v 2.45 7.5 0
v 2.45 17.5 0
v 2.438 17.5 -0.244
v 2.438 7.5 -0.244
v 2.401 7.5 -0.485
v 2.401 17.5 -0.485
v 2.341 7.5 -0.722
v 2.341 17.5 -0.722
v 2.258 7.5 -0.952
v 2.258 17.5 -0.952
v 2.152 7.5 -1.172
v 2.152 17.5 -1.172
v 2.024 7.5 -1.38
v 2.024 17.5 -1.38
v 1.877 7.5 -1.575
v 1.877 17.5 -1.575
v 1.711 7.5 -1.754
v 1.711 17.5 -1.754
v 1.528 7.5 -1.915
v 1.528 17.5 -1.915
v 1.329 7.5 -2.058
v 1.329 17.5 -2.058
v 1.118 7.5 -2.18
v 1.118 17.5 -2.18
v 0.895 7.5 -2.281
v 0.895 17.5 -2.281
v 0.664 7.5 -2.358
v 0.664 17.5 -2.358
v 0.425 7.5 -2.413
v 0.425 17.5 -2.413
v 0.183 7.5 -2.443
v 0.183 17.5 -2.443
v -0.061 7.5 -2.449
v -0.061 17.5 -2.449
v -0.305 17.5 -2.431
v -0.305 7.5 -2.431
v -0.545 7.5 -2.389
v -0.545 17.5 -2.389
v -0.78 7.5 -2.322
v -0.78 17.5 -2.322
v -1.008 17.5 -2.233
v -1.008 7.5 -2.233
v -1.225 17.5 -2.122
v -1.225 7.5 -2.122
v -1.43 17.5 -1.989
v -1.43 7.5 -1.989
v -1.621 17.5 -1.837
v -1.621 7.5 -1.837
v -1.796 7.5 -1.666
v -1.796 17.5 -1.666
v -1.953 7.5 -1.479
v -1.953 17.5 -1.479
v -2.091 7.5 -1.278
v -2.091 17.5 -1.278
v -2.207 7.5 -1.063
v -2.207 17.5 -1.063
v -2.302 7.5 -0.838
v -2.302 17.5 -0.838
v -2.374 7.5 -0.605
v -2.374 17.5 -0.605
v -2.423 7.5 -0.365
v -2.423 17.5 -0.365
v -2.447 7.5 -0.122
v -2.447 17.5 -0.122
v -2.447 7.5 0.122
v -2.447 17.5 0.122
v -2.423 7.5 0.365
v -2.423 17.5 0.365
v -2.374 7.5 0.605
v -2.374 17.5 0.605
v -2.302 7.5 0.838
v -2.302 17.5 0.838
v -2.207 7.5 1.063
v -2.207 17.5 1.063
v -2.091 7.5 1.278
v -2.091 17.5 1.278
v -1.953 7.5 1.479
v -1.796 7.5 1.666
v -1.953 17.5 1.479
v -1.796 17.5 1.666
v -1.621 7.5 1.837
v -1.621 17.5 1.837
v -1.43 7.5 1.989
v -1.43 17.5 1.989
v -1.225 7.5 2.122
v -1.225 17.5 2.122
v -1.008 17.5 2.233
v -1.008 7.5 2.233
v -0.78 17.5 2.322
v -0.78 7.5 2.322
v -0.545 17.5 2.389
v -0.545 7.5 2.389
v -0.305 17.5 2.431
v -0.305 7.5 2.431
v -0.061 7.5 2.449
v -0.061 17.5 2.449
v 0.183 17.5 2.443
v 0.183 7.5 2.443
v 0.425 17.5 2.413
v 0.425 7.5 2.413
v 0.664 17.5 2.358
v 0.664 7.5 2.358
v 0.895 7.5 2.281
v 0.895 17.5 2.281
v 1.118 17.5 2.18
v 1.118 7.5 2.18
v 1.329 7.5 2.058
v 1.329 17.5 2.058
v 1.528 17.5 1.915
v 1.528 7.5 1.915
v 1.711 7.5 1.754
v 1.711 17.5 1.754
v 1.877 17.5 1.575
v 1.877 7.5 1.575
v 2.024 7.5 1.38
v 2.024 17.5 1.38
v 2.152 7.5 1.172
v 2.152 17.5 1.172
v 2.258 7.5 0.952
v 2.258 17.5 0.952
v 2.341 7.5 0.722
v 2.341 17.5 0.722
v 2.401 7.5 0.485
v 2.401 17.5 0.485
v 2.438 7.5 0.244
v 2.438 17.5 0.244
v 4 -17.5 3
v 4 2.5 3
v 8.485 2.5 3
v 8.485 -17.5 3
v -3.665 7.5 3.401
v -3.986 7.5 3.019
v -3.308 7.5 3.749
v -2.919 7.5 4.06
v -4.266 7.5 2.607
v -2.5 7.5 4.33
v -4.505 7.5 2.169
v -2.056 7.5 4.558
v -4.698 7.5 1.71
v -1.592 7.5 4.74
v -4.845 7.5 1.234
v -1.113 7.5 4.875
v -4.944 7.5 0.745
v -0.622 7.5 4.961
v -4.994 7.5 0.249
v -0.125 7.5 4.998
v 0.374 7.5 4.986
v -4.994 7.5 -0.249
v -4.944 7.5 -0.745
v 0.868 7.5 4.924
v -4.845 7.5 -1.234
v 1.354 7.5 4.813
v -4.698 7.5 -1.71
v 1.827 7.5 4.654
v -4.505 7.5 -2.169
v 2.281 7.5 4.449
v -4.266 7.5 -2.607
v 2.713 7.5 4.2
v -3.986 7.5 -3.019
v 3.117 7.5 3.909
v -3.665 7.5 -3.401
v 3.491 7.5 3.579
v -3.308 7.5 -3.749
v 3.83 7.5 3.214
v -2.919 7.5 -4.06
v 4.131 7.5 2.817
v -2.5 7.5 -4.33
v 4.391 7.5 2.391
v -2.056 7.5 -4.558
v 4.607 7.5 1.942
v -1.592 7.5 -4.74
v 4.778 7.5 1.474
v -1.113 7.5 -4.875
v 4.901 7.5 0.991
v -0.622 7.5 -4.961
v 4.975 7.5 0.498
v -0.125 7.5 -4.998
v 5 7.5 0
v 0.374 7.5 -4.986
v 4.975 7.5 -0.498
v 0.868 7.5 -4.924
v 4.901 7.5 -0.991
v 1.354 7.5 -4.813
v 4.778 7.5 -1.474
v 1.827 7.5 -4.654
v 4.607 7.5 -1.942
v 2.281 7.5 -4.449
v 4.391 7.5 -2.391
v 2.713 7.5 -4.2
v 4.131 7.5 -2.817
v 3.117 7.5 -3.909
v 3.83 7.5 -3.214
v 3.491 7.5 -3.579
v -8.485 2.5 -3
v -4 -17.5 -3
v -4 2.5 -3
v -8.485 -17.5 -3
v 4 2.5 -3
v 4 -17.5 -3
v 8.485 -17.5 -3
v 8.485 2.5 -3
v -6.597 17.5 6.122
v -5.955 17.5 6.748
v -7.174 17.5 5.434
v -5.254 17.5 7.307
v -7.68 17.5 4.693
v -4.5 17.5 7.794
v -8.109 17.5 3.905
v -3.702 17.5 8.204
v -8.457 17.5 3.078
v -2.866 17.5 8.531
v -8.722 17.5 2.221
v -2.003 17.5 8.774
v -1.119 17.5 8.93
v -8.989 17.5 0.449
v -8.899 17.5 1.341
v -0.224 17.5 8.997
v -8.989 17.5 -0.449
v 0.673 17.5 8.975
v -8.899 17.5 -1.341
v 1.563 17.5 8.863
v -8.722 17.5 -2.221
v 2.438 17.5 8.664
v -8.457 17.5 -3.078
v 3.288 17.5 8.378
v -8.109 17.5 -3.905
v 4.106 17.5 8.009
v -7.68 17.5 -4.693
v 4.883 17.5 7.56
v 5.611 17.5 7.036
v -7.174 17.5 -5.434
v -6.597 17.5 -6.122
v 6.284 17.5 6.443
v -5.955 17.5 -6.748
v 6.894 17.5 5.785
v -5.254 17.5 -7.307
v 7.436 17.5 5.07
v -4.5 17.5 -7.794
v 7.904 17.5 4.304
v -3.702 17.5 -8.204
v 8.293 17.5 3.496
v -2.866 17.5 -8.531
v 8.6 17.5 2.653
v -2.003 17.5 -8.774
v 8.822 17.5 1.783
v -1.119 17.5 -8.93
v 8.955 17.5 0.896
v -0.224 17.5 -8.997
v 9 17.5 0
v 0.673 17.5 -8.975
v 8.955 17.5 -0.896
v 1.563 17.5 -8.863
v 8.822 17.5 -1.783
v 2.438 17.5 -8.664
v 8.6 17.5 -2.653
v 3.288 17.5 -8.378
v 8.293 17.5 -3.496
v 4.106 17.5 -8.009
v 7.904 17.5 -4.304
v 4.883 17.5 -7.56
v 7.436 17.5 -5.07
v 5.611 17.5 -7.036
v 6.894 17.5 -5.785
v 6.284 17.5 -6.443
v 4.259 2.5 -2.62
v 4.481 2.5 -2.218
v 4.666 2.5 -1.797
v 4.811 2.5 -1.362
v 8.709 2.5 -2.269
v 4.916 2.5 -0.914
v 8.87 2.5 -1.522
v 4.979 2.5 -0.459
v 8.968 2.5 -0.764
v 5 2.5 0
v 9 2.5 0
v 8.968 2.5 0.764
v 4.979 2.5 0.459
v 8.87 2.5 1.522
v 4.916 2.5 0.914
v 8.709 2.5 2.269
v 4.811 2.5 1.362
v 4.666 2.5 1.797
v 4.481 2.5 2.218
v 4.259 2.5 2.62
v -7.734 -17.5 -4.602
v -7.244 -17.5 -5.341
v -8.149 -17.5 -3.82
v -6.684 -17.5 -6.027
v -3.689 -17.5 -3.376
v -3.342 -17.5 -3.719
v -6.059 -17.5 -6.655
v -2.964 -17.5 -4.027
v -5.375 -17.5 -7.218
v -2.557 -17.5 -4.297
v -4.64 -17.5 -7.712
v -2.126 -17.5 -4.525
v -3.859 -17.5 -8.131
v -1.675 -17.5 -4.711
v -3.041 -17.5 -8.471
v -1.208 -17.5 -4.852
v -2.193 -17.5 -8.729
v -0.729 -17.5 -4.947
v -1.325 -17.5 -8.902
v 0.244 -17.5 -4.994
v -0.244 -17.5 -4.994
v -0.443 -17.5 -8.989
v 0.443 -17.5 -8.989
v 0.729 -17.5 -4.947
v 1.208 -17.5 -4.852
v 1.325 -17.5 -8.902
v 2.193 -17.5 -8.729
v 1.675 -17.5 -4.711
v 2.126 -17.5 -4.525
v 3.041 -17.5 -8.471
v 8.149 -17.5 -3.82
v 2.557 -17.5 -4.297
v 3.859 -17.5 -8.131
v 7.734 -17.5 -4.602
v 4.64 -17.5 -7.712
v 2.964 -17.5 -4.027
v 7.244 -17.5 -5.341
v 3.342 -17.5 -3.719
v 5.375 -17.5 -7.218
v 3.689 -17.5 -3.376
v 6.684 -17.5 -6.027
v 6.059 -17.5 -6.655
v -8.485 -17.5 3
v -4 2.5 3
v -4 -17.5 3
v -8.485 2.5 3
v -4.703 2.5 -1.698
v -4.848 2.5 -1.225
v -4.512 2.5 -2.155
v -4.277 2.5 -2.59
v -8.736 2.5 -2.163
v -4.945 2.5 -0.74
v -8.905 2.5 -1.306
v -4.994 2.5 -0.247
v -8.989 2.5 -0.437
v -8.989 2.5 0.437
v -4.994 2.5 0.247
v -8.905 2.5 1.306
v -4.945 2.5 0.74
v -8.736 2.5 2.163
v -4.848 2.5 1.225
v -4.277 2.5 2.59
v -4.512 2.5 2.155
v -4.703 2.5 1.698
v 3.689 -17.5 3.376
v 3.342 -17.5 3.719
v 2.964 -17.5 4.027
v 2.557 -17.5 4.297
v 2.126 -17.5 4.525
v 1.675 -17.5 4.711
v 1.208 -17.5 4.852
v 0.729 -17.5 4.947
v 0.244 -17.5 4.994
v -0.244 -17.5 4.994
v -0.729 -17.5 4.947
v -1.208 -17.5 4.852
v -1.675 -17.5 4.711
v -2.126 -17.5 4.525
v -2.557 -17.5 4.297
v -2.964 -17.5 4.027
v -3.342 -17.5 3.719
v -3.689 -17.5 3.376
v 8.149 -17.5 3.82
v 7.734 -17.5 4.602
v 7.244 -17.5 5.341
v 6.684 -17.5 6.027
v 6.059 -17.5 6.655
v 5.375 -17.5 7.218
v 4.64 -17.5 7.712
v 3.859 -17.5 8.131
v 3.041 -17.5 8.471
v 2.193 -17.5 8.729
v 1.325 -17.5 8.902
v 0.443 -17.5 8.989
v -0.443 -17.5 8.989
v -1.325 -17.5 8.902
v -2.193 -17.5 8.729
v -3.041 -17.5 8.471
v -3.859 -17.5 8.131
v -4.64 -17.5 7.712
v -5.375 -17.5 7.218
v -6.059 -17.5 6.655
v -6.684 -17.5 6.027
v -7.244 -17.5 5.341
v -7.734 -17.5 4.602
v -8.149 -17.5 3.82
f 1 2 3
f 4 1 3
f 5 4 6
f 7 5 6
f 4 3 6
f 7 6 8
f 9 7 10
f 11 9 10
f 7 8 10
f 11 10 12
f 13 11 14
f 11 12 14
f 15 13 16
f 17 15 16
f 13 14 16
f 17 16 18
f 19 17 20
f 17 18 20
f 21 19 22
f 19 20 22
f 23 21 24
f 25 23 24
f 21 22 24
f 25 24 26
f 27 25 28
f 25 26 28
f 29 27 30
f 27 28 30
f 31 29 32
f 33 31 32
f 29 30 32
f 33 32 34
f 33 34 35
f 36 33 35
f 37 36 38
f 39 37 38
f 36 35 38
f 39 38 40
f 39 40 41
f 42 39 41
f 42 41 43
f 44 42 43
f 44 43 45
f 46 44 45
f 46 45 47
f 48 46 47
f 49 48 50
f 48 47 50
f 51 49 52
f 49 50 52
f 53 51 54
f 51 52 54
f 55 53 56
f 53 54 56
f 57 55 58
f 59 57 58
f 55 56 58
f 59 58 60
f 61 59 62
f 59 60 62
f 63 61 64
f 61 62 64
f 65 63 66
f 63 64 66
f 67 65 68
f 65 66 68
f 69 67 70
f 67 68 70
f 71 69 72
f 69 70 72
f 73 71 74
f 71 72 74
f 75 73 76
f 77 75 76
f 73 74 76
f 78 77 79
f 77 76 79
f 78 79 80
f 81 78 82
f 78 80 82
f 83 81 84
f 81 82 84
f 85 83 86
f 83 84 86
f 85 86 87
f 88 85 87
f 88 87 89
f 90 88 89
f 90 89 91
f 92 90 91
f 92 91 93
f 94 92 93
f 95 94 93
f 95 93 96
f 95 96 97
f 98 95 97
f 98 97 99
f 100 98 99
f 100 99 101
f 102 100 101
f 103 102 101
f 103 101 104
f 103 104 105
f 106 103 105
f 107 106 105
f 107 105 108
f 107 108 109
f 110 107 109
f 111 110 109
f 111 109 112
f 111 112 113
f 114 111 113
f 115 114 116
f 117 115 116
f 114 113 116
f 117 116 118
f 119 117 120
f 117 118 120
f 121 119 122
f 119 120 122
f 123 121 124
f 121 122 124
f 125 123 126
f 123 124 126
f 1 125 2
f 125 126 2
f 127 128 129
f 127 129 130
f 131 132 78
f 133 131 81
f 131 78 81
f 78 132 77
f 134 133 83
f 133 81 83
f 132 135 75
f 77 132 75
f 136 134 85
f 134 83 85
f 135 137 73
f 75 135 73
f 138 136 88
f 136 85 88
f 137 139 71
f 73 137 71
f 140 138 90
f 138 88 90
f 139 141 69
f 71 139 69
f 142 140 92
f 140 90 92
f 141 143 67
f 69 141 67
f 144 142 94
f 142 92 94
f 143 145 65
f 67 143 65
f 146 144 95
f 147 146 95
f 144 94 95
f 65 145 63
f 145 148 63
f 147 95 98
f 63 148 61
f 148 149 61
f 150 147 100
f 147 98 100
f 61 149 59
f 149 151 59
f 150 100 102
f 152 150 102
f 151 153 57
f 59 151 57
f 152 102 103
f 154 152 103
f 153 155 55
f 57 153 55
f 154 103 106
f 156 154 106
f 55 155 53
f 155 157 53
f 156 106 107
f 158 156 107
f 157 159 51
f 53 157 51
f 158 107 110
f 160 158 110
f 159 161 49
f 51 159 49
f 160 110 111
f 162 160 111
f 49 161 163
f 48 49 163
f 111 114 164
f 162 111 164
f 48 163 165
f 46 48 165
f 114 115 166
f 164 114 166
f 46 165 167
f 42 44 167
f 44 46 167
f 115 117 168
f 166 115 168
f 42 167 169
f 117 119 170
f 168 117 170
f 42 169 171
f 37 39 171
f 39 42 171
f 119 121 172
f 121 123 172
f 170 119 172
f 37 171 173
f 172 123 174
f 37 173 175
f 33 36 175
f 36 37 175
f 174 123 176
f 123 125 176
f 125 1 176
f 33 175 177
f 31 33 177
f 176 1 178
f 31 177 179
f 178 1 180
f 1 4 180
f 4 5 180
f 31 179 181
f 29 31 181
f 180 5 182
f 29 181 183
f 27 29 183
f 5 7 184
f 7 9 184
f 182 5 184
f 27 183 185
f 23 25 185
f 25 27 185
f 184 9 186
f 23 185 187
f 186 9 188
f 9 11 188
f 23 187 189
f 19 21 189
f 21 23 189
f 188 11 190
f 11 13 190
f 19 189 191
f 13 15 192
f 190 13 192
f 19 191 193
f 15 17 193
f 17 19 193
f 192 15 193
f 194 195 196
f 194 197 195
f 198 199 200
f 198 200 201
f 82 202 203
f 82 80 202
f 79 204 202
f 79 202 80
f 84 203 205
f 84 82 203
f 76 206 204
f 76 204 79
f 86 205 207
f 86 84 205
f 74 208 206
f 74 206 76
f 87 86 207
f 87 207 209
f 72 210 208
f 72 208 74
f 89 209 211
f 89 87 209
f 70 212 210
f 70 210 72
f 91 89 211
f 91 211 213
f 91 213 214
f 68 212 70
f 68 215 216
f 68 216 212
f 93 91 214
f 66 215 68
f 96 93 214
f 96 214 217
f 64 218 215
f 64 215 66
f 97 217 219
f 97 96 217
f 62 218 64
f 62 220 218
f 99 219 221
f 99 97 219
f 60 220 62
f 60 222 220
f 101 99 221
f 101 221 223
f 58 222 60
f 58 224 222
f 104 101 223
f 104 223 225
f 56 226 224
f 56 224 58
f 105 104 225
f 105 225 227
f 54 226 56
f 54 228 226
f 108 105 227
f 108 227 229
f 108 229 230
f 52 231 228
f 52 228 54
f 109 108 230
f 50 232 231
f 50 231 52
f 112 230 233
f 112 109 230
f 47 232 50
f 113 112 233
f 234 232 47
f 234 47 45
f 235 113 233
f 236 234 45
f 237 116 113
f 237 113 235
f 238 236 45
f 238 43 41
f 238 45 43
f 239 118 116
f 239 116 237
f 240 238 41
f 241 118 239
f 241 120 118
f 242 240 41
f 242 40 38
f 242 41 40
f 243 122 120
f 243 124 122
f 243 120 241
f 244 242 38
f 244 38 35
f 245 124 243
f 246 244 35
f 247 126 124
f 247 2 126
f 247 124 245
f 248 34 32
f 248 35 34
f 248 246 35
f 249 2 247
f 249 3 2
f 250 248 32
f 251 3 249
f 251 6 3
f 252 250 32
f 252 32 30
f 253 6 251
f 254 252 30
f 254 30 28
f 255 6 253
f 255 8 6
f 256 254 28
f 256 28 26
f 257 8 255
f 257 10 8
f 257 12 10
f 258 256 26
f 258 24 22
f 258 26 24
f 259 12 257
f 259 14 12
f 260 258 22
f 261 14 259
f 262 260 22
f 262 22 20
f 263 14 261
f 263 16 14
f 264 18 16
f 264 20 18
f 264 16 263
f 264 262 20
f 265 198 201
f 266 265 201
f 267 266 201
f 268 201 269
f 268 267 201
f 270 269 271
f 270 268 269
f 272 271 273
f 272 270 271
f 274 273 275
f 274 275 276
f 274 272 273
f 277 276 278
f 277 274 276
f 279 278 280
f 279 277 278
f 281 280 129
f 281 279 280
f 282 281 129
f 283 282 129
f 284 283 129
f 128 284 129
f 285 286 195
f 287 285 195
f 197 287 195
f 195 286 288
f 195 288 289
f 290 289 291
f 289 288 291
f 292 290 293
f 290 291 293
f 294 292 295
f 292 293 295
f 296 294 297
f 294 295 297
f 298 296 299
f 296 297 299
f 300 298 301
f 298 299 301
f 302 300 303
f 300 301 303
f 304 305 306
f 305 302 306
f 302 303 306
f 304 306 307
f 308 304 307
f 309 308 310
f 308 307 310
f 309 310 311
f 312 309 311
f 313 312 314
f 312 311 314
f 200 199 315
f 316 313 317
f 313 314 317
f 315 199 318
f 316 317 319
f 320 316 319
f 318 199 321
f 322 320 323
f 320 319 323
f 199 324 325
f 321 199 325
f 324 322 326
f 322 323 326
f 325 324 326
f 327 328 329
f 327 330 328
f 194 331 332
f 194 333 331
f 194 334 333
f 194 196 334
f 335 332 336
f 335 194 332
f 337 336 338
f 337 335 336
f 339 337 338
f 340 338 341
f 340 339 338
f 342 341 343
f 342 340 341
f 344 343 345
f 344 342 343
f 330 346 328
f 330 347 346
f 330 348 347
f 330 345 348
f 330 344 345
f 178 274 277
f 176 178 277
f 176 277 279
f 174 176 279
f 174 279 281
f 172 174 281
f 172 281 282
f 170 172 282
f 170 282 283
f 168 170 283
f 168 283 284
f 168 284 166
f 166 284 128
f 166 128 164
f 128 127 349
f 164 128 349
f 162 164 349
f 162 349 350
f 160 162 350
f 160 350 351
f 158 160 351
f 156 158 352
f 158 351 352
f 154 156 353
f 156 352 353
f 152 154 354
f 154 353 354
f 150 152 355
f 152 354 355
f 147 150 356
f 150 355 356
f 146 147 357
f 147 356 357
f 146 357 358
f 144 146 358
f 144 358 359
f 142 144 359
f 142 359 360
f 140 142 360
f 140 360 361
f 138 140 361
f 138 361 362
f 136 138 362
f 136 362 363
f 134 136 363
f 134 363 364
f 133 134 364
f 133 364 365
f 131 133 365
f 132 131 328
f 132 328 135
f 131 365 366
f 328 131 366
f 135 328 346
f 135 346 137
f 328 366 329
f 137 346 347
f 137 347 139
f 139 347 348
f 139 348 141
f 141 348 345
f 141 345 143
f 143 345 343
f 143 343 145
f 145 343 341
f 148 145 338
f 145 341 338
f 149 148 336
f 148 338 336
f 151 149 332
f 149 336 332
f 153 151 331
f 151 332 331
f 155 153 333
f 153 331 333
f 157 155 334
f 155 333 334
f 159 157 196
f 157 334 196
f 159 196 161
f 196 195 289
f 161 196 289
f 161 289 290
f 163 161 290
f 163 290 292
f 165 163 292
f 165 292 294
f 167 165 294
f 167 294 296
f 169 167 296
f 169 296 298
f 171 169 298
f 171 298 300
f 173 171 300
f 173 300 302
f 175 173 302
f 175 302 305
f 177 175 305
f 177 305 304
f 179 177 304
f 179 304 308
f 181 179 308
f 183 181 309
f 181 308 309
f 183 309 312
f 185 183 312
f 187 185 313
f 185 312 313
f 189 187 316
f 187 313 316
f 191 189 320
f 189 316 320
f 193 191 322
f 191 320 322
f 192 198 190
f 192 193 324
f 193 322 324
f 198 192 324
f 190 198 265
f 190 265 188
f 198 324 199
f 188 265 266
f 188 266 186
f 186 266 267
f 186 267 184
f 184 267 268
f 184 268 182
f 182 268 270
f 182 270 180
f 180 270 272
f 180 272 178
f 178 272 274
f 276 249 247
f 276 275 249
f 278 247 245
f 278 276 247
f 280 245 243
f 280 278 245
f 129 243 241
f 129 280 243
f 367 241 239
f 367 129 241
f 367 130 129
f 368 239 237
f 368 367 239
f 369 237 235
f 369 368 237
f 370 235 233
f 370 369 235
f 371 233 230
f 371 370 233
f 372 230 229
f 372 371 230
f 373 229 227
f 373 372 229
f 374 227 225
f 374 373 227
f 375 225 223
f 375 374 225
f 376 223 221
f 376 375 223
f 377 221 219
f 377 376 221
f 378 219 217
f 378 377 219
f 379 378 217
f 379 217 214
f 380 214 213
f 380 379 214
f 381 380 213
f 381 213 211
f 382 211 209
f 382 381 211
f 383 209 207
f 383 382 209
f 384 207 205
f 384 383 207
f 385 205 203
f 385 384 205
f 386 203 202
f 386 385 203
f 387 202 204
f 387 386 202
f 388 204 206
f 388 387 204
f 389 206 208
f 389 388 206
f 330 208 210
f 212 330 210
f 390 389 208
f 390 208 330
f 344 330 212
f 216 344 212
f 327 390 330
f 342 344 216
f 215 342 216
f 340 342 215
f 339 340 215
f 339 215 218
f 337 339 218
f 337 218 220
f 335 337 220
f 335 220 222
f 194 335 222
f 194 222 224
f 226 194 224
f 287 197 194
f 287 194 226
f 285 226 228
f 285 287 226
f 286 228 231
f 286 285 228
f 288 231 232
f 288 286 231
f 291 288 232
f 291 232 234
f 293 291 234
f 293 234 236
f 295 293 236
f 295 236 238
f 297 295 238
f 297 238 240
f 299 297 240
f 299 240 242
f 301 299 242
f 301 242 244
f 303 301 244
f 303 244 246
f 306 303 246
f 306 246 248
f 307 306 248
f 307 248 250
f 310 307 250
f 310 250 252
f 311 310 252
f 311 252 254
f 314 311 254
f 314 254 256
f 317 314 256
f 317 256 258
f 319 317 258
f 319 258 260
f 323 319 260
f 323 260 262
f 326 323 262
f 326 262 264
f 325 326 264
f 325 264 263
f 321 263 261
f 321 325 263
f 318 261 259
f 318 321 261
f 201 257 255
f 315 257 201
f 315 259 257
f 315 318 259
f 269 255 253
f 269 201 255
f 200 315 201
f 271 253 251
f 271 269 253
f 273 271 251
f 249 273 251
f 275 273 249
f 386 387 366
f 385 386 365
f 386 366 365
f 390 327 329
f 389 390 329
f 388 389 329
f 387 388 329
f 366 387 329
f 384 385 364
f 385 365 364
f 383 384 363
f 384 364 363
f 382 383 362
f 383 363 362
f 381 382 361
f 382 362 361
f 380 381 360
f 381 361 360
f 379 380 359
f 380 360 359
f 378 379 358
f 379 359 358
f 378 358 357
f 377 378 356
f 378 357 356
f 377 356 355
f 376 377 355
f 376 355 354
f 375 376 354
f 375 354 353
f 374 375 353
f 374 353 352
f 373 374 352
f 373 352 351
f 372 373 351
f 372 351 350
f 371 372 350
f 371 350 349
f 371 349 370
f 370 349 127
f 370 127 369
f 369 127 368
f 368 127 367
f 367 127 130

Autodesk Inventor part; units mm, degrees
ref_plane "YZ Plane" through (0, 0, 0) normal (1, 0, 0) x (0, 1, 0)
ref_plane "XZ Plane" through (0, 0, 0) normal (0, 1, 0) x (-1, 0, 0)
ref_plane "XY Plane" through (0, 0, 0) normal (0, 0, 1) x (1, 0, 0)
sketch "Sketch1" plane through (0, 0, 0) normal (0, 0, 1) x (1, 0, 0)
  line L0 (0, 17.5) -> (9, 17.5)
  line L1 (9, 17.5) -> (9, -17.5)
  line L2 (9, -17.5) -> (0, -17.5)
  line L3 (0, -17.5) -> (0, 17.5)
  line L4 (0, 7.5) -> (2.45, 7.5)
  line L5 (2.45, 7.5) -> (2.45, 17.5)
  line L6 (2.45, 17.5) -> (0, 17.5)
  line L7 (0, 17.5) -> (0, 7.5)
  line L8 (0, 7.5) -> (5, 7.5)
  line L9 (5, 7.5) -> (5, -17.5)
  line L10 (5, -17.5) -> (0, -17.5)
  line L11 (0, -17.5) -> (0, 7.5)
  point P0 (0, 0)
  dimension "d0" = 9
  dimension "d1" = 35
  dimension "d2" = 17.5
  dimension "d3" = 10
  dimension "d4" = 2.45
  dimension "d5" = 5
revolve "Revolution1" add sketch "Sketch1" angle 360 about axis through (0, -17.5, 0) along (0, 1, 0) contours L0 L1 L2 L9 L8 L5
sketch "Sketch2" plane through (0, 0, 0) normal (1, 0, 0) x (0, 1, 0)
  line L0 (-17.5, 5) -> (-17.5, -5) projected
  line L1 (2.5, 3) -> (-17.5, 3)
  line L2 (-17.5, 3) -> (-17.5, -3)
  line L3 (-17.5, -3) -> (2.5, -3)
  line L4 (2.5, -3) -> (2.5, 3)
  line L5 (-17.5, 5) -> (7.5, 5) projected
  line L6 (-17.5, -5) -> (7.5, -5) projected
  line L7 (7.5, 5) -> (7.5, -5) projected
  point P0 (2.5, 0)
  dimension "d7" = 2
  dimension "d8" = 2
  dimension "d11" = 5
extrude "Extrusion1" cut sketch "Sketch2" along normal through all both and the other way through all contours L1 L4 L3 L0
equation "\"d2\" = 0.5 * d1"
properties part number "mini fidget foot"
